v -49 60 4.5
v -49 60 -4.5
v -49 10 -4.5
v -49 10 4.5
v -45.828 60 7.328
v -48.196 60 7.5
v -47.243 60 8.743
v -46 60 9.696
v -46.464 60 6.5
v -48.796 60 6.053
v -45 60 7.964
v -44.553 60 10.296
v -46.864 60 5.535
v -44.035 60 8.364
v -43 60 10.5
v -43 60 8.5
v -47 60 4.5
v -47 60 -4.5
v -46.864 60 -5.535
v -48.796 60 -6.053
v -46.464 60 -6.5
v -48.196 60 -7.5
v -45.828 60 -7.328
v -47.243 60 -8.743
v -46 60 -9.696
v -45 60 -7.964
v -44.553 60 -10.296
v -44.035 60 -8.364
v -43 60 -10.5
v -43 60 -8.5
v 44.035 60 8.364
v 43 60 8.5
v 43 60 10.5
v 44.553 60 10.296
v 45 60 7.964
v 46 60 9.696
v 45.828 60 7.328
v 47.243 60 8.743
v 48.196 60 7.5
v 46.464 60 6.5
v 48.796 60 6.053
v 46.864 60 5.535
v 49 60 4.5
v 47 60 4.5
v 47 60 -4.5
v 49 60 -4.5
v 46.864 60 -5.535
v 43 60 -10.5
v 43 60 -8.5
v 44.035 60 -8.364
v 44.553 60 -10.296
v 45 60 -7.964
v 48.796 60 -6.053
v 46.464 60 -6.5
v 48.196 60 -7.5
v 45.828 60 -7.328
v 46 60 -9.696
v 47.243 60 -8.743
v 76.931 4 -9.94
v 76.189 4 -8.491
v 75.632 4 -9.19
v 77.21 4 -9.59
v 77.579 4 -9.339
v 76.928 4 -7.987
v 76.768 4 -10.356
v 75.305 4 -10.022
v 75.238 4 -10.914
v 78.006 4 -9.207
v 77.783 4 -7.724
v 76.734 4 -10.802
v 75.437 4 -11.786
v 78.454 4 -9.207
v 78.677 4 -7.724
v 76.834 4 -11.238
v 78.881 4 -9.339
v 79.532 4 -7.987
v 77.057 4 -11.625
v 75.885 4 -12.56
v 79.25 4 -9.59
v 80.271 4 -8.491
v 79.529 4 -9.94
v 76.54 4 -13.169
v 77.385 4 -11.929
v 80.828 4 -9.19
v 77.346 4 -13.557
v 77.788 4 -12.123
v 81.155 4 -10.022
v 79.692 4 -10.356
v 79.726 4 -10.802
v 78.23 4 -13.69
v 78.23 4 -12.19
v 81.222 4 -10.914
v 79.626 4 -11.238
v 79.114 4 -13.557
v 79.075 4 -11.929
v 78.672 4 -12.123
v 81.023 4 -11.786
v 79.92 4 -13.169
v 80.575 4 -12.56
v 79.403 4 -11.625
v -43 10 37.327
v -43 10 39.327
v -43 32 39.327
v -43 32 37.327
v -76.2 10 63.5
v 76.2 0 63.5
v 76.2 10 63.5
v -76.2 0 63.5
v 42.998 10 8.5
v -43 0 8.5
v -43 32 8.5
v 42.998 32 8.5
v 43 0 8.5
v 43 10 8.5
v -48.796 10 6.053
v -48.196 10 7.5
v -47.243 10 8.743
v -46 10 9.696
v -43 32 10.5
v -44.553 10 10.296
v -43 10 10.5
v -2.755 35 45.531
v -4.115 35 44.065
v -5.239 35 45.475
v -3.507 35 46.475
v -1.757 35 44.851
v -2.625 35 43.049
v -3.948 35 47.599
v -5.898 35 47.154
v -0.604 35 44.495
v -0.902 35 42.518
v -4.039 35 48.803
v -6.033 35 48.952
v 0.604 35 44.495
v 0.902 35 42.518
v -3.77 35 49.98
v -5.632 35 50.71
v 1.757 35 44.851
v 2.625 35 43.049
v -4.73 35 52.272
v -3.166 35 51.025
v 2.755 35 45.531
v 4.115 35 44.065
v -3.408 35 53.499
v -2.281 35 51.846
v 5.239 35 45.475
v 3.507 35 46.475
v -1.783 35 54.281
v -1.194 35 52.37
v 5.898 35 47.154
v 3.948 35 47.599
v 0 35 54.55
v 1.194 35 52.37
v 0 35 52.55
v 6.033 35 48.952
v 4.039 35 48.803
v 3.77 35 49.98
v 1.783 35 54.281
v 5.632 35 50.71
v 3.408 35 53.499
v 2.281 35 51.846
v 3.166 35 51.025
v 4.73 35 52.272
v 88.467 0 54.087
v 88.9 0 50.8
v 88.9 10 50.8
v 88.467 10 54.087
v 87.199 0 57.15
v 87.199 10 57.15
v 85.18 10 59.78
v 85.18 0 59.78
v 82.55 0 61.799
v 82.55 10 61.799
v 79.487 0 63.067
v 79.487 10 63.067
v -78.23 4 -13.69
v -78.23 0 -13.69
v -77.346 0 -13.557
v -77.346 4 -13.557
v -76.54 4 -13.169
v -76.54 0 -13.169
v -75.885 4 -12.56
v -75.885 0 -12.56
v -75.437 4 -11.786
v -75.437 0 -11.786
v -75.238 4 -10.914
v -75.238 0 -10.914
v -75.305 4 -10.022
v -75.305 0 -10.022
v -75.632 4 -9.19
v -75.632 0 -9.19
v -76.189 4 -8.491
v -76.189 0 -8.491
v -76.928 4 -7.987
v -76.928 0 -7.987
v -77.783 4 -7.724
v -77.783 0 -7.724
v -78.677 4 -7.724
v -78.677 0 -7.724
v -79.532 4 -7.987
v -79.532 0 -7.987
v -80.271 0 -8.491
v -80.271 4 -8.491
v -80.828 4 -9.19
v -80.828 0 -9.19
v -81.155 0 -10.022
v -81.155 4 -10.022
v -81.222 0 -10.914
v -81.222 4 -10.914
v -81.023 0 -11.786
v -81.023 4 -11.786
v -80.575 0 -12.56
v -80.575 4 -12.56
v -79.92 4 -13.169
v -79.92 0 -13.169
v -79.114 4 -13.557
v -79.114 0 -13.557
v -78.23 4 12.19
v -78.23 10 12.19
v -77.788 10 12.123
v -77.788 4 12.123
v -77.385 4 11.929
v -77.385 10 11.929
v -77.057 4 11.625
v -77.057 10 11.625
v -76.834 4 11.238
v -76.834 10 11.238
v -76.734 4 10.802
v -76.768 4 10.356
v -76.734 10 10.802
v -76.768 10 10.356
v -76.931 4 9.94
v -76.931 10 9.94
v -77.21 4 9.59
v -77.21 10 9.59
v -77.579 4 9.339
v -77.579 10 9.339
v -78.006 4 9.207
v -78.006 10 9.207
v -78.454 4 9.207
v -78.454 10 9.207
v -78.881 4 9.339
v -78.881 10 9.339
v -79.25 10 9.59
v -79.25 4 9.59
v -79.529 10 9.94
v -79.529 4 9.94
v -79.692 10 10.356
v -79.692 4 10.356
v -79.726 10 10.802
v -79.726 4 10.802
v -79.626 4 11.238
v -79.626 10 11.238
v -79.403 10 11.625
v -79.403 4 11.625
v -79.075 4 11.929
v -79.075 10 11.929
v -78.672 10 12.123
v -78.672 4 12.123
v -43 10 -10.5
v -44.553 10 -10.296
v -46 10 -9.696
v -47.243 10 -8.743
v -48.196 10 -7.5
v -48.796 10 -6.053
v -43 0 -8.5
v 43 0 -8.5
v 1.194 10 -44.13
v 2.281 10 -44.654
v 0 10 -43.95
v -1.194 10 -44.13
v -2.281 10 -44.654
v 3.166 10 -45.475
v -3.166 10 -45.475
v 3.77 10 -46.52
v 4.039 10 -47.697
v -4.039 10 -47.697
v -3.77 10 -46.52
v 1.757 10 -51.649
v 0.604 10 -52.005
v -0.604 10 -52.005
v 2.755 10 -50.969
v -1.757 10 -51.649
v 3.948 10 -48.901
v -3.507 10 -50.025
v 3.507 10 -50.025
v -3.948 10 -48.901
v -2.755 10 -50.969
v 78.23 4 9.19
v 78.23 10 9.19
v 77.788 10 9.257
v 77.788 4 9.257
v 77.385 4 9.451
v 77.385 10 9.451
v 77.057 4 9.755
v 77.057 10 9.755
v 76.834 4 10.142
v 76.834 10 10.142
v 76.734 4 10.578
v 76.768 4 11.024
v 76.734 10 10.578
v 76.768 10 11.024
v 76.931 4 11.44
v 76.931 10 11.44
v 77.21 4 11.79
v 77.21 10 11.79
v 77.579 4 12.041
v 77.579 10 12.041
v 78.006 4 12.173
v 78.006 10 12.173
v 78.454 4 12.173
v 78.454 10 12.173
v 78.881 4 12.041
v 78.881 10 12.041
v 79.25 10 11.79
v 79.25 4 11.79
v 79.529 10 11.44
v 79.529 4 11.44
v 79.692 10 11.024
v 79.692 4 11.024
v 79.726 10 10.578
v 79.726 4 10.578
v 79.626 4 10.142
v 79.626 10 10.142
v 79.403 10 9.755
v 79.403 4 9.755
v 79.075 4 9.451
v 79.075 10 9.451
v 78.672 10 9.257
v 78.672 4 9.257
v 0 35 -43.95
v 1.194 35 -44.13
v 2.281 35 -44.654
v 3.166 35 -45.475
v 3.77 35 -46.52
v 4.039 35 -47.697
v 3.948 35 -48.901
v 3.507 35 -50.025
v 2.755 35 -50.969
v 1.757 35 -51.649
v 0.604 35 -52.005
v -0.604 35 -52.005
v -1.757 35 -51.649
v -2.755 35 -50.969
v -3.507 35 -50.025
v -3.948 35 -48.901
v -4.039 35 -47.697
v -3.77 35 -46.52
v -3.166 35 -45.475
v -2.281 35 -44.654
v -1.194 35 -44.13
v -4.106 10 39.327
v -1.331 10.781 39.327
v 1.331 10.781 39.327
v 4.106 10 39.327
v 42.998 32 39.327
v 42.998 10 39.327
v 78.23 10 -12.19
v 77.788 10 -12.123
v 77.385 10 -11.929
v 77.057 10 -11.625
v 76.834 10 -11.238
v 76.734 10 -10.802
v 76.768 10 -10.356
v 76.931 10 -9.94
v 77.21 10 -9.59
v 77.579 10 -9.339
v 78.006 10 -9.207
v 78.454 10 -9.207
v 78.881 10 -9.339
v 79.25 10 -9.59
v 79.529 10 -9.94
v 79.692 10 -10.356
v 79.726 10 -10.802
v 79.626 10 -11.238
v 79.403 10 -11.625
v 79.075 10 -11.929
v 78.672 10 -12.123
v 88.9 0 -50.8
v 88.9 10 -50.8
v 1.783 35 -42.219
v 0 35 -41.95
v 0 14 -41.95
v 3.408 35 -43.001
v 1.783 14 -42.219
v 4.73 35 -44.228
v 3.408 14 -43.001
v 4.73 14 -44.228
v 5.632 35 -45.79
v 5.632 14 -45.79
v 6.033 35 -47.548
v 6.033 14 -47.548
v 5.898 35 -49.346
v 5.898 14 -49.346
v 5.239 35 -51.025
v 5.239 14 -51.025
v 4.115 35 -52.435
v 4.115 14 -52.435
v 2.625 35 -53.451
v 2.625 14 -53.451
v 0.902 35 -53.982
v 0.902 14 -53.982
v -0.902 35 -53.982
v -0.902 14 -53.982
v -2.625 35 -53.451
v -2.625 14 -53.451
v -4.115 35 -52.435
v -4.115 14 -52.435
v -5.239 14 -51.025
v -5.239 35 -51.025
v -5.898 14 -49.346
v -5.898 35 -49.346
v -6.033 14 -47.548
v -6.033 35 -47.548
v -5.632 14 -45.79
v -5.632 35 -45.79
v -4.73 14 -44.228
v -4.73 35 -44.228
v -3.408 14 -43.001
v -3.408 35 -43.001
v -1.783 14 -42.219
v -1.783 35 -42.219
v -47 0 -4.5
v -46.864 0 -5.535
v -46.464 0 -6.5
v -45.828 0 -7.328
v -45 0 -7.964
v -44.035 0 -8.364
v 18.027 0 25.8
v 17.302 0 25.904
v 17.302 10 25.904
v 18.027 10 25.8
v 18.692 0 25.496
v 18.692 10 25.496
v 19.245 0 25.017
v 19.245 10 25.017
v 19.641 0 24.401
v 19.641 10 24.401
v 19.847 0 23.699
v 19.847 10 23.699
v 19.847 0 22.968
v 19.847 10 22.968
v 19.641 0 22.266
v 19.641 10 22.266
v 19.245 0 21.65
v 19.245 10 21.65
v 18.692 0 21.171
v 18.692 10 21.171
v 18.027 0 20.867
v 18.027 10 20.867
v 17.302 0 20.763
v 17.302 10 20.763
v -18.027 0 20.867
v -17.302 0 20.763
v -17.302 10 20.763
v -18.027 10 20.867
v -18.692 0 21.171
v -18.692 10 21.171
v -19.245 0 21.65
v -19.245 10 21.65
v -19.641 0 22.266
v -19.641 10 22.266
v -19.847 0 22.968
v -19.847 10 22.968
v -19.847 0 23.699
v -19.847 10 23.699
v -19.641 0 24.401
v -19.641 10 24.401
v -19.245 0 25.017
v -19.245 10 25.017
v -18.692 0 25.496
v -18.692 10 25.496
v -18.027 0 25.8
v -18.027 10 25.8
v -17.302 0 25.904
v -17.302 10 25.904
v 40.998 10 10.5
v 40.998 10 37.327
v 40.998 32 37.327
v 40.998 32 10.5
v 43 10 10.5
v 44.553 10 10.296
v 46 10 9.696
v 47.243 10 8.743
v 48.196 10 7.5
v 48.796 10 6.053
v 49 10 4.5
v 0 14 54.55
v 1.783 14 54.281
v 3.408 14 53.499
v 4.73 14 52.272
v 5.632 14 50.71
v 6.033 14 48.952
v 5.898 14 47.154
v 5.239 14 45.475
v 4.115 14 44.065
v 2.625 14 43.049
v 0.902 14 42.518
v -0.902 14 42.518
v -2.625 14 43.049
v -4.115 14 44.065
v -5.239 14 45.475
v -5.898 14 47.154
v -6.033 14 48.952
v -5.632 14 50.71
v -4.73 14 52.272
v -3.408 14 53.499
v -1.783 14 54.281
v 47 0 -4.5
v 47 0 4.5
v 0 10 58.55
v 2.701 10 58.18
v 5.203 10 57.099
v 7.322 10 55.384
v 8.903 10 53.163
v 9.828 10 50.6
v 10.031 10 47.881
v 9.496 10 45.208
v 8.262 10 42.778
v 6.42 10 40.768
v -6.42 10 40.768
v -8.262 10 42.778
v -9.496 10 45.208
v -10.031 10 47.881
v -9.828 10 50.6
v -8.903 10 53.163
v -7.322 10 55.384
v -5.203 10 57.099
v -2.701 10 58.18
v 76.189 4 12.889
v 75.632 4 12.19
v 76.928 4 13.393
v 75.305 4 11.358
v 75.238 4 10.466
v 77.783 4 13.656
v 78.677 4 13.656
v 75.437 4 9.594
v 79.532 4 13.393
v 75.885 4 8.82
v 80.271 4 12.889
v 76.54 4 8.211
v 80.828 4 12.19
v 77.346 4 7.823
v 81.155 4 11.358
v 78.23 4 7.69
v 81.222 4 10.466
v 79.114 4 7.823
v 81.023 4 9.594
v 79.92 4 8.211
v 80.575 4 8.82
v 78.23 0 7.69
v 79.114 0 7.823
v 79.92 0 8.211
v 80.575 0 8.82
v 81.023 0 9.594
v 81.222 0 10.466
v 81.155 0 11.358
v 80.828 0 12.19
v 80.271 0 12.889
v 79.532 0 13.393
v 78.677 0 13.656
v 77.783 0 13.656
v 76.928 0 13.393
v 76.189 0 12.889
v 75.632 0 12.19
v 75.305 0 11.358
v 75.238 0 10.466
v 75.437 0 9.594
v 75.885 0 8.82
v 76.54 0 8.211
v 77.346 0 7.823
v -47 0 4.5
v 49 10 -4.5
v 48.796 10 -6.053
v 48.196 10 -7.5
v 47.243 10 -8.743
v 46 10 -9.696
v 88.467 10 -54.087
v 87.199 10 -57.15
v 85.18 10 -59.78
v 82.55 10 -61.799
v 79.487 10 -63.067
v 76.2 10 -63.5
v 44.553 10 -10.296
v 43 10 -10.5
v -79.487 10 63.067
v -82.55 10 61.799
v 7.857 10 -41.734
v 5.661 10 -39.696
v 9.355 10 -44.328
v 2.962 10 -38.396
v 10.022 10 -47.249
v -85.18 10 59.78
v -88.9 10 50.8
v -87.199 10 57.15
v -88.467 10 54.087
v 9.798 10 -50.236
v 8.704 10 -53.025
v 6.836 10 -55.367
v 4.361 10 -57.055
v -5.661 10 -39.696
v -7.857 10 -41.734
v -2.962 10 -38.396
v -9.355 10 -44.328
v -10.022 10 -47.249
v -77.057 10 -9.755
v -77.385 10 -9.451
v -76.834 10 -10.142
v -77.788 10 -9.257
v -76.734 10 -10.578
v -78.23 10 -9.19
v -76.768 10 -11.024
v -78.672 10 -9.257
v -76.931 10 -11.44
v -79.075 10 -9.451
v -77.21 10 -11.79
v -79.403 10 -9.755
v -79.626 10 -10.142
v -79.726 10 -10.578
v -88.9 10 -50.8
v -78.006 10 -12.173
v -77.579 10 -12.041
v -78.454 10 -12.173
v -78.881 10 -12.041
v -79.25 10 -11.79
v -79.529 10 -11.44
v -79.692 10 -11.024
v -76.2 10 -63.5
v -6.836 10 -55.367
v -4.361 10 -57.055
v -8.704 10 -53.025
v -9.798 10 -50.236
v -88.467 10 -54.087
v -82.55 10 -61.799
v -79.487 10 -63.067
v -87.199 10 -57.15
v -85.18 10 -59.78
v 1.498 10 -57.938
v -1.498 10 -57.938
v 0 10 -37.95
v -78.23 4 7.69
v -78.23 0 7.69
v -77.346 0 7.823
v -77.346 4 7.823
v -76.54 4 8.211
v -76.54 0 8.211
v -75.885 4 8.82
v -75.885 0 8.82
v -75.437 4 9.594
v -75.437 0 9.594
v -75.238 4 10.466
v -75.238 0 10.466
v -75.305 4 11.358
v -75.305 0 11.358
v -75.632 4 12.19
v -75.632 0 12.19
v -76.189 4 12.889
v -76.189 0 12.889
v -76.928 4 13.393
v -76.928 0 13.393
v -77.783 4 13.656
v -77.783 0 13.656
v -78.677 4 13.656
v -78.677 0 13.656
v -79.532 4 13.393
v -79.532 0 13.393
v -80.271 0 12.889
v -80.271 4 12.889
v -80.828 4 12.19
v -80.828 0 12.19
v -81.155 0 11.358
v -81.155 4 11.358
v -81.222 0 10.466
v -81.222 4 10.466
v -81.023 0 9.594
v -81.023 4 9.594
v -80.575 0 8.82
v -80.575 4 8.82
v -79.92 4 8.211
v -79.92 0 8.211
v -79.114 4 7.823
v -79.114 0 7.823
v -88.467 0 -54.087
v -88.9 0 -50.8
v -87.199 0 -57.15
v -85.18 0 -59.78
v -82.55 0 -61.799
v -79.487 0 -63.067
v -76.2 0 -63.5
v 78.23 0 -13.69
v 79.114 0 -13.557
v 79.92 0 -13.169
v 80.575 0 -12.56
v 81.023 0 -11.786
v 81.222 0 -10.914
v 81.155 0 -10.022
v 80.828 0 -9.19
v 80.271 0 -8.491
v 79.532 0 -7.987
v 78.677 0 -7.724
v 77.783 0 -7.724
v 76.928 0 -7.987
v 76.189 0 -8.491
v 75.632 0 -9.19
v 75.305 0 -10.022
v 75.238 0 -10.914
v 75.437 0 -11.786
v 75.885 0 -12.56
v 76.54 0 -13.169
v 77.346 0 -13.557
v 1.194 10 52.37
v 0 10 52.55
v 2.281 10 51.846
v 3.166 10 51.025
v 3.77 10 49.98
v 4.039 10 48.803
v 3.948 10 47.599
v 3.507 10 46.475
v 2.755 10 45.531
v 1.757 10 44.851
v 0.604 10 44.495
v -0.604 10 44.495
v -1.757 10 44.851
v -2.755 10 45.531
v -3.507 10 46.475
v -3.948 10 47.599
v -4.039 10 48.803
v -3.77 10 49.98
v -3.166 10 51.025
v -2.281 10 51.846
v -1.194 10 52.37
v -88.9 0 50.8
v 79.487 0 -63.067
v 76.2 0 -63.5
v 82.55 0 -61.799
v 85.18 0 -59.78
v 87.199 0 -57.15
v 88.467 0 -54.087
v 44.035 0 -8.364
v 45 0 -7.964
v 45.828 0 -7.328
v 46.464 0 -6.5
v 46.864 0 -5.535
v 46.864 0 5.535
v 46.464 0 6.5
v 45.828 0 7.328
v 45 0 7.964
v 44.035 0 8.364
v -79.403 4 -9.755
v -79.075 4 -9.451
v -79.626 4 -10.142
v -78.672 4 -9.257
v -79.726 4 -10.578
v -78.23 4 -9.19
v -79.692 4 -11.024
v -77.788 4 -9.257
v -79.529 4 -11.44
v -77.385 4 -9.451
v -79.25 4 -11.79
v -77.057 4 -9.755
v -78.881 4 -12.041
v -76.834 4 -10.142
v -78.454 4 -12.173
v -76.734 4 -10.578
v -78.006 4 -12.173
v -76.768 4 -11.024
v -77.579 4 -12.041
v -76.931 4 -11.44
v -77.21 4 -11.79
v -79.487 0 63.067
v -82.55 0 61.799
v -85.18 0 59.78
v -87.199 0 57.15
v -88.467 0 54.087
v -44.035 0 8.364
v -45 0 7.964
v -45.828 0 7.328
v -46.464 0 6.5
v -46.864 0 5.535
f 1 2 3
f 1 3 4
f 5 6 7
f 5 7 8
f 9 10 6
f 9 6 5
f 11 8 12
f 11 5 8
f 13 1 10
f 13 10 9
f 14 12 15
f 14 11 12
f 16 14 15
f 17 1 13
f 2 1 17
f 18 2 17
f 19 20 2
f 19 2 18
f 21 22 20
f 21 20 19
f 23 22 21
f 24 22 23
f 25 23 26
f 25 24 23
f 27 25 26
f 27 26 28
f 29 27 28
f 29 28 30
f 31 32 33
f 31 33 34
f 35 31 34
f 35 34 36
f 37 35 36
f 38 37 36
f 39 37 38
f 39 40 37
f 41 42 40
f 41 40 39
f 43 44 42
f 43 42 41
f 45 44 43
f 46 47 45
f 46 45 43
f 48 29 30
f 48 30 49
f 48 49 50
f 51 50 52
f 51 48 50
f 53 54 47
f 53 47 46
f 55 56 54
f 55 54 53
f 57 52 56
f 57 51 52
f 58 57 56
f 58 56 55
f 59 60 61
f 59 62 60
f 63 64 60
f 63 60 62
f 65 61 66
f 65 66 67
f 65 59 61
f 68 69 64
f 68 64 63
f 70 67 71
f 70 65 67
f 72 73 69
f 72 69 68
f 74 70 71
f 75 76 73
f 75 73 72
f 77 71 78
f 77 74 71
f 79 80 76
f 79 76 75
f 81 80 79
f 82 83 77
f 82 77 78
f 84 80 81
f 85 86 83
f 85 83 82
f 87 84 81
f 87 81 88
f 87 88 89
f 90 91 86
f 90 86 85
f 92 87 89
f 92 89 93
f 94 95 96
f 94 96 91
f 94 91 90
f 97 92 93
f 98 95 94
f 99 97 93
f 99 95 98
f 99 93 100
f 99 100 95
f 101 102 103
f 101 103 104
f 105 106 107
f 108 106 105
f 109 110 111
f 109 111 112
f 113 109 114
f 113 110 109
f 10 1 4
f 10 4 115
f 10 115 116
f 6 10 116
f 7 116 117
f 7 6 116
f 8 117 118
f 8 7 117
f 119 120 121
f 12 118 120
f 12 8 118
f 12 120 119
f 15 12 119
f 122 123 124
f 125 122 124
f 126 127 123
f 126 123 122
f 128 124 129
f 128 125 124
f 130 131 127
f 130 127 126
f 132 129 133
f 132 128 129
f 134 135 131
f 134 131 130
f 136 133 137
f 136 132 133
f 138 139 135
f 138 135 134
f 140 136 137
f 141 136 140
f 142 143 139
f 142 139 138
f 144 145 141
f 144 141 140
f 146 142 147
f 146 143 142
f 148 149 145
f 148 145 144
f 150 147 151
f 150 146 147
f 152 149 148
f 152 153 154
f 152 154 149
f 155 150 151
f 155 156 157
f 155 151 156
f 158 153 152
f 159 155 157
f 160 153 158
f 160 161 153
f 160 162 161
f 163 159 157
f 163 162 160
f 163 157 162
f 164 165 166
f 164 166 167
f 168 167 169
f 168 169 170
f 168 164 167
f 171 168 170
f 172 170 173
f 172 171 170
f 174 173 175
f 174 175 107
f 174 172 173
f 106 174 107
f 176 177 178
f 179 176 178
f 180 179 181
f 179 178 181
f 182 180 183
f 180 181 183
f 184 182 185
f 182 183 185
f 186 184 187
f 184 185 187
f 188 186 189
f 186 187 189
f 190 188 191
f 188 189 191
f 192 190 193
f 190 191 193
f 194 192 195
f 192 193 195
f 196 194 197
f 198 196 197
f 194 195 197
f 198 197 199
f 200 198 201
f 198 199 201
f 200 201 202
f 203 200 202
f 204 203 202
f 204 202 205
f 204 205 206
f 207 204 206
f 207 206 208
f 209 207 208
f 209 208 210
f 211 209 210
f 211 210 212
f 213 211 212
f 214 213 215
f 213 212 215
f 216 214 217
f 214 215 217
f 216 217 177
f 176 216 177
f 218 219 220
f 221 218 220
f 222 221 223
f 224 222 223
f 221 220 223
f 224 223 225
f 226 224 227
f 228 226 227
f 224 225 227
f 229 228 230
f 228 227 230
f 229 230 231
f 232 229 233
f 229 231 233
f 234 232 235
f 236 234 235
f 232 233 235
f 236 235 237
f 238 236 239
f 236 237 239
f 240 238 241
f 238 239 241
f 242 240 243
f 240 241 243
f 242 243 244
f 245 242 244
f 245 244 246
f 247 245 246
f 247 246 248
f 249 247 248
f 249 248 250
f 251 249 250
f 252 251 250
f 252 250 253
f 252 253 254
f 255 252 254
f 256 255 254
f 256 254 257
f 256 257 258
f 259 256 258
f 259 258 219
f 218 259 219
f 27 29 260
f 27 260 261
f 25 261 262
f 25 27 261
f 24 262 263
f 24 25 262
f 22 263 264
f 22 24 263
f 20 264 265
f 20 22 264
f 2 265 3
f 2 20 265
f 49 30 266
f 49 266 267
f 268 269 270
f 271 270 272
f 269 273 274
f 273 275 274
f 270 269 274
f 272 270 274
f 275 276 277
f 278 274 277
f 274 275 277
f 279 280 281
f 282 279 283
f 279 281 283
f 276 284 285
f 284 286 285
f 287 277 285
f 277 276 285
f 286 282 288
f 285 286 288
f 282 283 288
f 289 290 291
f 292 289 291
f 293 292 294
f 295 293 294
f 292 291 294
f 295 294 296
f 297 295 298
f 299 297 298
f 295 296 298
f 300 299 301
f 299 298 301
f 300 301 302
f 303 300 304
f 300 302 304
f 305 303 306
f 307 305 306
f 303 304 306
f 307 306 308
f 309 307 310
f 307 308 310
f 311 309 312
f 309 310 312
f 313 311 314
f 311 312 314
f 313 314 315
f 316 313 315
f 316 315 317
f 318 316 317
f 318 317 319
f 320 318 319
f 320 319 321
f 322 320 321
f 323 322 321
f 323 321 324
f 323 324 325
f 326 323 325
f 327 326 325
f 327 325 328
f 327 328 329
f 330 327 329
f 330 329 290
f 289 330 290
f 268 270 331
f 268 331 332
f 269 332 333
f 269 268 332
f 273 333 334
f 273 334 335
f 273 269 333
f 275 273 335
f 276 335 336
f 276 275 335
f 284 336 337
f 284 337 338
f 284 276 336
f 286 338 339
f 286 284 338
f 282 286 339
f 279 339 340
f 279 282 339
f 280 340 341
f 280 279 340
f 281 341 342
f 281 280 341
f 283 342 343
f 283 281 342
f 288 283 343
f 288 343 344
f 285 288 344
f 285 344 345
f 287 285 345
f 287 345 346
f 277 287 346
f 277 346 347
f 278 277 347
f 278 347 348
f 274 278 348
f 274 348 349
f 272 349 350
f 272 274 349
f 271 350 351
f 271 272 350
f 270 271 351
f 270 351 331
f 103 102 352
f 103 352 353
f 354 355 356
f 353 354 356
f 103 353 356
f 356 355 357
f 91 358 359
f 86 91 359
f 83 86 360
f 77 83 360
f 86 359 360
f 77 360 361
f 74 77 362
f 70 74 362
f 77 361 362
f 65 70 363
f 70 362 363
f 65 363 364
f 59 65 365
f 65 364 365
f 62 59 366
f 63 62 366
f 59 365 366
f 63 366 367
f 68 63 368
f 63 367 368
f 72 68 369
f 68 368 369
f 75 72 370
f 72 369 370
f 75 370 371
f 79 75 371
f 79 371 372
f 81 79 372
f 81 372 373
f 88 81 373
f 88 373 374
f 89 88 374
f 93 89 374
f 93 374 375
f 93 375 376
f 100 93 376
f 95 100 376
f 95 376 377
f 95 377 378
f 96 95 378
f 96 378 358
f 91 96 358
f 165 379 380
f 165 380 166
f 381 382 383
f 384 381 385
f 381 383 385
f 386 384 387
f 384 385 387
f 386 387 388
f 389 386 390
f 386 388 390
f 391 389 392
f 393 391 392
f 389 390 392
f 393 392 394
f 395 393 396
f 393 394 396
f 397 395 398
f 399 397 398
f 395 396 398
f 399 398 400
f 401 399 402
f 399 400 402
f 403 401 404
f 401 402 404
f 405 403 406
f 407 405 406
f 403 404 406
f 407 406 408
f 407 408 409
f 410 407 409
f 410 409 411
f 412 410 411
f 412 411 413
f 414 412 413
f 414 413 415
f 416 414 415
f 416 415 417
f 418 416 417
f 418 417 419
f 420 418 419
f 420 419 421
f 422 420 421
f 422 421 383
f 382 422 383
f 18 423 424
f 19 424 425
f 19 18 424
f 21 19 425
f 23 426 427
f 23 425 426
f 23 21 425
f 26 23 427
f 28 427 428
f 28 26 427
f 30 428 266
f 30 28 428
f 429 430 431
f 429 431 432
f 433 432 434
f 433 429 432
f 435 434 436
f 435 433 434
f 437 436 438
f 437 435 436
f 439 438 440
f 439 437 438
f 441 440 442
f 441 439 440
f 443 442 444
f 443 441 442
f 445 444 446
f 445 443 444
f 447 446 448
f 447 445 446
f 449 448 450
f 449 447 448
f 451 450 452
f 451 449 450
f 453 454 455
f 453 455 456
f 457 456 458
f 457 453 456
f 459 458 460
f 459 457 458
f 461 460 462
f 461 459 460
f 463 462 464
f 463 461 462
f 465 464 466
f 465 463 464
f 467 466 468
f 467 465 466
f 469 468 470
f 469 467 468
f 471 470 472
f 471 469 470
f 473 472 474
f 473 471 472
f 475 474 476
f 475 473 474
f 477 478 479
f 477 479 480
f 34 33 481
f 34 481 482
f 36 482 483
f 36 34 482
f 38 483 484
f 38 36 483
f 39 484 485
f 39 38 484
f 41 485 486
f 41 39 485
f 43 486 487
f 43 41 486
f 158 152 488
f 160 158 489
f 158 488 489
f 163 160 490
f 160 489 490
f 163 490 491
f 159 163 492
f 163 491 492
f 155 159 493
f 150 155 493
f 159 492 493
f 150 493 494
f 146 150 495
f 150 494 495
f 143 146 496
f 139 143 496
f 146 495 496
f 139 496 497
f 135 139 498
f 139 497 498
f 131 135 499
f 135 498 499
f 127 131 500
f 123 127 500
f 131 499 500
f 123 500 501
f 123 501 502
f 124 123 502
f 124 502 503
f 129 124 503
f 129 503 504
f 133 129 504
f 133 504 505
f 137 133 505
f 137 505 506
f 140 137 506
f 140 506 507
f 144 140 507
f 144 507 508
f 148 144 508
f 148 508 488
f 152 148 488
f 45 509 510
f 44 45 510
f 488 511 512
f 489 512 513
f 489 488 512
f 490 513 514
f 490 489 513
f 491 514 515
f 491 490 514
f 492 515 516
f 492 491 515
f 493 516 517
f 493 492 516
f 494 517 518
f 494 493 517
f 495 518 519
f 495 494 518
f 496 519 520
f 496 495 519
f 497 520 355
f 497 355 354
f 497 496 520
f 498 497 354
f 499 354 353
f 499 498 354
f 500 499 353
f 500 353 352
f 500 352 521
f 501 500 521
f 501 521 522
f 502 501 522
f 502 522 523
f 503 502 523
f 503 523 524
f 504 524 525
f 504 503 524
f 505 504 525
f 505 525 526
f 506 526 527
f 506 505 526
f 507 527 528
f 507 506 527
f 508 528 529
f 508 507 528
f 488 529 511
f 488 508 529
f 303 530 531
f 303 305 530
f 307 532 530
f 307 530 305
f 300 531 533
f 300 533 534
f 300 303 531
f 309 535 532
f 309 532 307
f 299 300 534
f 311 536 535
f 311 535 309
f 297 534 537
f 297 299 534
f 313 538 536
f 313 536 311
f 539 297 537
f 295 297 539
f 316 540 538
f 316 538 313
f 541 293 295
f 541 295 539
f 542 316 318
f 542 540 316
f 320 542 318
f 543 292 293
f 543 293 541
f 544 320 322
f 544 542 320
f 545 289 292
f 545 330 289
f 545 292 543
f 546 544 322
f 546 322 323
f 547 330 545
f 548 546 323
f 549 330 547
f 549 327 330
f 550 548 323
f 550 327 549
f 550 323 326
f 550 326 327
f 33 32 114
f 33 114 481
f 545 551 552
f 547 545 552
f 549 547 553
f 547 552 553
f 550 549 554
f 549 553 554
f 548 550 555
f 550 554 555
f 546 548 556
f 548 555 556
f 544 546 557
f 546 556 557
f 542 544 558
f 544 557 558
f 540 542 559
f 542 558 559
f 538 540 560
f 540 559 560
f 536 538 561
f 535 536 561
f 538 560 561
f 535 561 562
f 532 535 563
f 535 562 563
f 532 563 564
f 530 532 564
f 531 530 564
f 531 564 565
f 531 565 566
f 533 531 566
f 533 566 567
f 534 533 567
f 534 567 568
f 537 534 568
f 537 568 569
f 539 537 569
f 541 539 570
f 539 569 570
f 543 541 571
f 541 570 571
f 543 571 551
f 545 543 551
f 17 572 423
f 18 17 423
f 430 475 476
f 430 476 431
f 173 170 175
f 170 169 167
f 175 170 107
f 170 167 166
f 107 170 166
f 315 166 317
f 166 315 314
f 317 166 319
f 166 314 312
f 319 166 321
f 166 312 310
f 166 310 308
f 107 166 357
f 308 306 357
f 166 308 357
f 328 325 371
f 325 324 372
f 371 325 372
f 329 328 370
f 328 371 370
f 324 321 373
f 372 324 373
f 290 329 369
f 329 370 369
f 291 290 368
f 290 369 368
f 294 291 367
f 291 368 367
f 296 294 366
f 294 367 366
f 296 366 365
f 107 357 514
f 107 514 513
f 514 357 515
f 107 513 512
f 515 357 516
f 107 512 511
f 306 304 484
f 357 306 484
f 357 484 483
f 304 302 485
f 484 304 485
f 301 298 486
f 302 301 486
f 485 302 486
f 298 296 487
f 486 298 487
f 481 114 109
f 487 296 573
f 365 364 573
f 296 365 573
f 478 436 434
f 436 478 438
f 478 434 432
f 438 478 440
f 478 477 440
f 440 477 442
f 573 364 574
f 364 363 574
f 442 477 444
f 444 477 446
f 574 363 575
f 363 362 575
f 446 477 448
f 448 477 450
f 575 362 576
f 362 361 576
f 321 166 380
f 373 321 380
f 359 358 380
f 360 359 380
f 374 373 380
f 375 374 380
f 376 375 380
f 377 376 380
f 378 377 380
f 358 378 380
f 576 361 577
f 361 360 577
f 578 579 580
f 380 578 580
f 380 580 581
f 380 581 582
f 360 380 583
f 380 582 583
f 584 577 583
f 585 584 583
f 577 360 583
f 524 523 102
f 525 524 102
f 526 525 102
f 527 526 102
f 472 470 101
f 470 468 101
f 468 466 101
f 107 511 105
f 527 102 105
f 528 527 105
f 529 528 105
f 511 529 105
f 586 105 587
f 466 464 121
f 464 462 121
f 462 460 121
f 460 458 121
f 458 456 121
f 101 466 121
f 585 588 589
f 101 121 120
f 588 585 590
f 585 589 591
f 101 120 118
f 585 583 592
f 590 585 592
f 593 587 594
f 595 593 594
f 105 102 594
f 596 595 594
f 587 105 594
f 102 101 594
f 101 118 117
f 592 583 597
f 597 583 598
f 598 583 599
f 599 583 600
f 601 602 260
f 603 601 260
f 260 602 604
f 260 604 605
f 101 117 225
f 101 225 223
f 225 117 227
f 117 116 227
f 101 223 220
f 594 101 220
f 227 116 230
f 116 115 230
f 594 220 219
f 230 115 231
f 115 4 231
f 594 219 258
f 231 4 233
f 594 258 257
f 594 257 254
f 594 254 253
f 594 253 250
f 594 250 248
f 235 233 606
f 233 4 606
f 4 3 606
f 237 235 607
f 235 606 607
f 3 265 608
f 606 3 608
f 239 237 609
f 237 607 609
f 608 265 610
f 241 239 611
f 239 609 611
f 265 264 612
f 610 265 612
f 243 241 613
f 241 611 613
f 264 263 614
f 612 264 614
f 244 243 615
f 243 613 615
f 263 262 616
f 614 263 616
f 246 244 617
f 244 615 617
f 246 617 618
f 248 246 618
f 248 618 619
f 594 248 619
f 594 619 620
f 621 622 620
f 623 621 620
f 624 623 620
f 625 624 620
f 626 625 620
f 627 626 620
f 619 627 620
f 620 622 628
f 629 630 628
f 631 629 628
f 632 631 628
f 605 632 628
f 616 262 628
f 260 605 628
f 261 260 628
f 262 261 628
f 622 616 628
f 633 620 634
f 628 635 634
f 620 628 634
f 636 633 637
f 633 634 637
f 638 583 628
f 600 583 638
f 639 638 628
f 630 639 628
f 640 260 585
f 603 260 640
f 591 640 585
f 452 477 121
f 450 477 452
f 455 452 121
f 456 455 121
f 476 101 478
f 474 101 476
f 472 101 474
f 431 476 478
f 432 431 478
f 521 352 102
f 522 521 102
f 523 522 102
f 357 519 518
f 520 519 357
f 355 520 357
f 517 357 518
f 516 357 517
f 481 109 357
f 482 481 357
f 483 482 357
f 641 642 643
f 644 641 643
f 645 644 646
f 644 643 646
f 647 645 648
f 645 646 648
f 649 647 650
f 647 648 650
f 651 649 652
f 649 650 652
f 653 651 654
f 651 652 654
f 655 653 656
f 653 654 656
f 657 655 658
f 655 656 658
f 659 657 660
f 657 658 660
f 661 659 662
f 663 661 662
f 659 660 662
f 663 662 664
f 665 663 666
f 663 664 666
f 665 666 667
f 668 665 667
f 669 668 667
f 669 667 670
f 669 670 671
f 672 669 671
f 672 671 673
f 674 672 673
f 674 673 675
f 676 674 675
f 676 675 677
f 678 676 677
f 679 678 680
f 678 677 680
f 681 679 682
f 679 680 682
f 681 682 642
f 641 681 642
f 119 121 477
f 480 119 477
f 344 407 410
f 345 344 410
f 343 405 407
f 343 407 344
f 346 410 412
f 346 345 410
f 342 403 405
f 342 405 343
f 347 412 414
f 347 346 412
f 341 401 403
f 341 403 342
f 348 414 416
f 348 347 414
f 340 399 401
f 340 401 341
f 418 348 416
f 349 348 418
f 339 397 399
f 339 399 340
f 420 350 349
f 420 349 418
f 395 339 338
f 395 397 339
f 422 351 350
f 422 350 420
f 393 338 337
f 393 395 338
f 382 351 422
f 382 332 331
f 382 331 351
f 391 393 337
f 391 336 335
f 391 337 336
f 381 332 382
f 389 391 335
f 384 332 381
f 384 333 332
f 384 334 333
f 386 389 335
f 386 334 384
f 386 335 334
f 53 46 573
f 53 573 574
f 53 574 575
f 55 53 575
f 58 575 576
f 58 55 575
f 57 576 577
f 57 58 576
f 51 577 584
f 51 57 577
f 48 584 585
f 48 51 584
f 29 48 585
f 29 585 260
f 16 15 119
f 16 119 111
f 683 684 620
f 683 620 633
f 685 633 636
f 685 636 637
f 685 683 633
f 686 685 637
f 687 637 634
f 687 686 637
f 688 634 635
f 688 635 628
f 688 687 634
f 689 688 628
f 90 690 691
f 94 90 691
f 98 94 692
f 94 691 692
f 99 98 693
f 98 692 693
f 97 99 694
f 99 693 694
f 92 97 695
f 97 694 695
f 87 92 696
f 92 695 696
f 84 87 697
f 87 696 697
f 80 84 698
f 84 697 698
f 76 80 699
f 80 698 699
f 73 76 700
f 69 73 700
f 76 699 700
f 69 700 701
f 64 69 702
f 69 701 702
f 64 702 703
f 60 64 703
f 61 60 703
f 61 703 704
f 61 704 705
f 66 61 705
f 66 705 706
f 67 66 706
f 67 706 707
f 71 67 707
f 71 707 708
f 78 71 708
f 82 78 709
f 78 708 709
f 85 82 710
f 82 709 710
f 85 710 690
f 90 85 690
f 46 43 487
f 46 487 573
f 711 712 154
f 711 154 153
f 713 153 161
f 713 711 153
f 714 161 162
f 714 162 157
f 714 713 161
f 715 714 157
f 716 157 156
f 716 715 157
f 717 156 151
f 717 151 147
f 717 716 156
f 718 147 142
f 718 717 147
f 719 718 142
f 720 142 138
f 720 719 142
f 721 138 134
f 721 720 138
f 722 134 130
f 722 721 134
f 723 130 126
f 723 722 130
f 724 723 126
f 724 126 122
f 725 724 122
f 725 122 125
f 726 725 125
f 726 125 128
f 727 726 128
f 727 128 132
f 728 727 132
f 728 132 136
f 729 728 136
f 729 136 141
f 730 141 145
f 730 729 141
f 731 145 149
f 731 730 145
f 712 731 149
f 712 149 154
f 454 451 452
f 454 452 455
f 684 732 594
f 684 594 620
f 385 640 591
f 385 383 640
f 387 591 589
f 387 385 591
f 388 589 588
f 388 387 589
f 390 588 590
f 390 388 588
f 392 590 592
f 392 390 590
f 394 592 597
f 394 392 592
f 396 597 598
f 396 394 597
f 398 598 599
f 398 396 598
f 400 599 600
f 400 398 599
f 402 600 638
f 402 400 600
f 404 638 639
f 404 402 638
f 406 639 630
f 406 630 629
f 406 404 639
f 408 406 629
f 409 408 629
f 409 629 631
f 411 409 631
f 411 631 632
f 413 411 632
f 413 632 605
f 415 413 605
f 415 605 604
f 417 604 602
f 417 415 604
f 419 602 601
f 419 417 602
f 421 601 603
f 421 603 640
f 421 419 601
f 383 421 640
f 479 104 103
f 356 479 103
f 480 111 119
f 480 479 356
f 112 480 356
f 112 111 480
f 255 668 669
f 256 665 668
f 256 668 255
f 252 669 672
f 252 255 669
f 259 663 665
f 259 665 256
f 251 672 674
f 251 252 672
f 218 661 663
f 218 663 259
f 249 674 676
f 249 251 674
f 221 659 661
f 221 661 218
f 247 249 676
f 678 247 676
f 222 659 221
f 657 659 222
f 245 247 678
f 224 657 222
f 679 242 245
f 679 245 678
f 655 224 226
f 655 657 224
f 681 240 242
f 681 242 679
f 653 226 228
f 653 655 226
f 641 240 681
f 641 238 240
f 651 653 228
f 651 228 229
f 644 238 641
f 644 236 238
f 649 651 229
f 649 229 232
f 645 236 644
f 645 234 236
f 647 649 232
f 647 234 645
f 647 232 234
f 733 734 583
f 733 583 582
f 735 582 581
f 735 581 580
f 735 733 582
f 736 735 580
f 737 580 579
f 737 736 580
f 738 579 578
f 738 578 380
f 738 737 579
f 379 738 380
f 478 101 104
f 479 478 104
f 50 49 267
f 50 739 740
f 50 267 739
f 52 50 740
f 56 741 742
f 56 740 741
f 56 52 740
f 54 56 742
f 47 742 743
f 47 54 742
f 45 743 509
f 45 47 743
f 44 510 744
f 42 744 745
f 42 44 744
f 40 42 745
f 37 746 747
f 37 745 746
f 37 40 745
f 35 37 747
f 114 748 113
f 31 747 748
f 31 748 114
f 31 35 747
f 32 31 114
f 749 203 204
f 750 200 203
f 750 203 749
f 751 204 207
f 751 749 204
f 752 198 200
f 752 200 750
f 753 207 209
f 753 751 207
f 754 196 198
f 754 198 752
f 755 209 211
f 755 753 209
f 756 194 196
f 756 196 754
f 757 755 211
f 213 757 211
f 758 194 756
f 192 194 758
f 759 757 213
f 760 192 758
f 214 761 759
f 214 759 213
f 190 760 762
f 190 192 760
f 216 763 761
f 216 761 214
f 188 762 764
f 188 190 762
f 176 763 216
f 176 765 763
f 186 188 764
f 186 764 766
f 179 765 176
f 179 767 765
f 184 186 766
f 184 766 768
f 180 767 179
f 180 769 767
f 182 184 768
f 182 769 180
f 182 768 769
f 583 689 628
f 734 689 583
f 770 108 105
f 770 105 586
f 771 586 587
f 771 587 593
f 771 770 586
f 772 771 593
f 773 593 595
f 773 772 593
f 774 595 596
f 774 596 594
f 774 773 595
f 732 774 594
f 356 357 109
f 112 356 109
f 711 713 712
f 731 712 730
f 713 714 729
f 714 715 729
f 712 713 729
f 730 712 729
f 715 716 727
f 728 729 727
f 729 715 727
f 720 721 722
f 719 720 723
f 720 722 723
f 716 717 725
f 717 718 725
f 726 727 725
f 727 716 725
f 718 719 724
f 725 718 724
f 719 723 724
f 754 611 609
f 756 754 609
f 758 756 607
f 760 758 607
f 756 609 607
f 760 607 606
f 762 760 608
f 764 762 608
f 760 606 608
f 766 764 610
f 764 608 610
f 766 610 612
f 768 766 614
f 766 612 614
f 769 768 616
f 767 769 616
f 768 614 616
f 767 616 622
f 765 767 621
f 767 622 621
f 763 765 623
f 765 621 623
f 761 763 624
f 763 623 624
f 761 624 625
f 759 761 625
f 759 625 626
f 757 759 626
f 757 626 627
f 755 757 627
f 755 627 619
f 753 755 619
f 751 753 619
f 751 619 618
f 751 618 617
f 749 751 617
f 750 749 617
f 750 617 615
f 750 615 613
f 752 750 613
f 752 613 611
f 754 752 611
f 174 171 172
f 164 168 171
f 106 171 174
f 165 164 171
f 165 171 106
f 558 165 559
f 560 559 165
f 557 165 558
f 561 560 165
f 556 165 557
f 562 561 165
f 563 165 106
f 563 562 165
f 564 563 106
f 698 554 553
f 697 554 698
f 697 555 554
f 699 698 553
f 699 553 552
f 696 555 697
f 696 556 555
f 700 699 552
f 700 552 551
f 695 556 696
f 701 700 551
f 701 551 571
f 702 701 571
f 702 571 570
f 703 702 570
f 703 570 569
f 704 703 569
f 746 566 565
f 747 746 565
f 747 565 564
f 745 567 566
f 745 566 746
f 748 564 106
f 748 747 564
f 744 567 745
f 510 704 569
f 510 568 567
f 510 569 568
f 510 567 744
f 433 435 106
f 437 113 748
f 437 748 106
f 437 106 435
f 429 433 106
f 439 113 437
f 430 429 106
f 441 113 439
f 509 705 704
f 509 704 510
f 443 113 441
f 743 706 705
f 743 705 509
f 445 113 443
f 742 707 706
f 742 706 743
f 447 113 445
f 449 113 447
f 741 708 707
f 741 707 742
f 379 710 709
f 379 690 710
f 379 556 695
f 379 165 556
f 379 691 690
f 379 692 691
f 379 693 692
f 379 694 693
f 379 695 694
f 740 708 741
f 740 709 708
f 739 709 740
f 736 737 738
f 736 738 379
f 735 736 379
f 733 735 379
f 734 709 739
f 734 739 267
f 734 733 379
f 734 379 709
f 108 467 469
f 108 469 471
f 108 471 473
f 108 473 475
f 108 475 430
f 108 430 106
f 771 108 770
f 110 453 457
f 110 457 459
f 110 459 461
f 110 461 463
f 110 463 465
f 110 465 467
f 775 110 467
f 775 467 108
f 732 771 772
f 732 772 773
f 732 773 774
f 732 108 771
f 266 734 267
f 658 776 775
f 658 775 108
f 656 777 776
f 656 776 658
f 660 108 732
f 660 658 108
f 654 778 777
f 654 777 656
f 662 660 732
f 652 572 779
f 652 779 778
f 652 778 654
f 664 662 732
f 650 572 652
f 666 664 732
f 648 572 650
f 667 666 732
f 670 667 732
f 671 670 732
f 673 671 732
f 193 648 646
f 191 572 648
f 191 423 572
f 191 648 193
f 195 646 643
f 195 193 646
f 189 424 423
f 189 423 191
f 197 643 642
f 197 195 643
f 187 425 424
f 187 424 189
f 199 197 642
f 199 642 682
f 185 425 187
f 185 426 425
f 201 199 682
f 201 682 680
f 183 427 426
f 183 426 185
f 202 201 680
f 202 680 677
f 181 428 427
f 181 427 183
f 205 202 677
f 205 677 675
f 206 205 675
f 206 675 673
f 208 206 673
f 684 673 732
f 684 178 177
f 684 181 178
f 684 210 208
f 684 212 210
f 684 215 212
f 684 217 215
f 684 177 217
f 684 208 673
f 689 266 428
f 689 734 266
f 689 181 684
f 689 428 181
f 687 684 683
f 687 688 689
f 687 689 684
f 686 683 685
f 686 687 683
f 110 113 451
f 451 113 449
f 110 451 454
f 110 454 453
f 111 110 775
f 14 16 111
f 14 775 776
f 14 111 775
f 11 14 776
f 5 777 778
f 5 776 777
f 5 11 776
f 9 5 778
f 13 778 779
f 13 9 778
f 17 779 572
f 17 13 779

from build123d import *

# Parameters (mm, degrees)
BOSS_EXTRUDE1_DEPTH = 10
SKETCH3_R           = 6.05
SKETCH3_R_2         = 4.05
BOSS_EXTRUDE2_DEPTH = 25
SKETCH4_R           = 1.5
CUT_EXTRUDE1_DEPTH  = 113.073458053
SKETCH5_R           = 3
CUT_EXTRUDE2_DEPTH  = 4
CUT_EXTRUDE3_DEPTH  = 113.073458053
SKETCH7_W           = 85.997746486
SKETCH7_H           = 30.827207152
SKETCH7_W_2         = 81.997746486
SKETCH7_H_2         = 26.827207152
BOSS_EXTRUDE3_DEPTH = 22
SKETCH9_W           = 26.827207152
SKETCH9_H           = 22
CUT_EXTRUDE7_DEPTH  = 22
BOSS_EXTRUDE4_START = 50
BOSS_EXTRUDE4_DEPTH = 50
CUT_EXTRUDE8_DEPTH  = 22
CHAMFER2_SIZE       = 4


with BuildPart() as part:
    # Sketch2 → Boss-Extrude1 (new body)
    with BuildSketch(Plane(origin=(0, 0, 0), x_dir=(1, 0, 0), z_dir=(0, 1, 0))):
        with BuildLine():
            Line((-76.2, 63.5), (76.2, 63.5))
            ThreePointArc((76.2, 63.5), (85.180256121, 59.780256121), (88.9, 50.8))
            Line((88.9, 50.8), (88.9, -50.8))
            ThreePointArc((88.9, -50.8), (85.180256121, -59.780256121), (76.2, -63.5))
            Line((76.2, -63.5), (-76.2, -63.5))
            ThreePointArc((-76.2, -63.5), (-85.180256121, -59.780256121), (-88.9, -50.8))
            Line((-88.9, -50.8), (-88.9, 50.8))
            ThreePointArc((-88.9, 50.8), (-85.180256121, 59.780256121), (-76.2, 63.5))
        make_face()
    extrude(amount=BOSS_EXTRUDE1_DEPTH)

    # Sketch3 → Boss-Extrude2 (add)
    # profile 1 of 2: a face of its own
    with BuildSketch(Plane(origin=(0, 10, 0), x_dir=(1, 0, 0), z_dir=(0, 1, 0))):
        with Locations(Location((0, 48, 0), (0, 0, 270))):
            Circle(SKETCH3_R)
        with Locations(Location((0, 48, 0), (0, 0, 270))):
            Circle(SKETCH3_R_2, mode=Mode.SUBTRACT)
    # profile 2 of 2: a face of its own
    with BuildSketch(Plane(origin=(0, 10, 0), x_dir=(1, 0, 0), z_dir=(0, 1, 0))):
        with Locations(Location((0, -48.5, 0), (0, 0, 270))):
            Circle(SKETCH3_R)
        with Locations(Location((0, -48.5, 0), (0, 0, 270))):
            Circle(SKETCH3_R_2, mode=Mode.SUBTRACT)
    extrude(amount=BOSS_EXTRUDE2_DEPTH)

    # Sketch4 → Cut-Extrude1 (cut, through all)
    with BuildSketch(Plane(origin=(0, 10, 0), x_dir=(1, 0, 0), z_dir=(0, 1, 0))):
        with Locations(Location((-78.23, 10.69, 0), (0, 0, 270))):
            Circle(SKETCH4_R)
        with Locations(Location((-78.23, -10.69, 0), (0, 0, 270))):
            Circle(SKETCH4_R)
        with Locations(Location((78.23, -10.69, 0), (0, 0, 90))):
            Circle(SKETCH4_R)
        with Locations(Location((78.23, 10.69, 0), (0, 0, 90))):
            Circle(SKETCH4_R)
    extrude(amount=-CUT_EXTRUDE1_DEPTH, mode=Mode.SUBTRACT)

    # Sketch5 → Cut-Extrude2 (cut)
    with BuildSketch(Plane.XZ):
        with Locations(Location((-78.23, 10.69, 0), (0, 0, 270))):
            Circle(SKETCH5_R)
        with Locations(Location((-78.23, -10.69, 0), (0, 0, 270))):
            Circle(SKETCH5_R)
        with Locations(Location((78.23, 10.69, 0), (0, 0, 270))):
            Circle(SKETCH5_R)
        with Locations(Location((78.23, -10.69, 0), (0, 0, 270))):
            Circle(SKETCH5_R)
    extrude(amount=-CUT_EXTRUDE2_DEPTH, mode=Mode.SUBTRACT)

    # Sketch6 → Cut-Extrude3 (cut, through all)
    with BuildSketch(Plane(origin=(0, 10, 0), x_dir=(1, 0, 0), z_dir=(0, 1, 0))):
        with BuildLine():
            Line((-43, 8.5), (43, 8.5))
            ThreePointArc((43, 8.5), (45.828427125, 7.328427125), (47, 4.5))
            Line((47, 4.5), (47, -4.5))
            ThreePointArc((47, -4.5), (45.828427125, -7.328427125), (43, -8.5))
            Line((43, -8.5), (-43, -8.5))
            ThreePointArc((-43, -8.5), (-45.828427125, -7.328427125), (-47, -4.5))
            Line((-47, -4.5), (-47, 4.5))
            ThreePointArc((-47, 4.5), (-45.828427125, 7.328427125), (-43, 8.5))
        make_face()
    extrude(amount=-CUT_EXTRUDE3_DEPTH, mode=Mode.SUBTRACT)

    # Sketch7 → Boss-Extrude3 (add)
    with BuildSketch(Plane(origin=(0, 10, 0), x_dir=(1, 0, 0), z_dir=(0, 1, 0))):
        with Locations((-0.001126757, -23.913603576)):
            Rectangle(SKETCH7_W, SKETCH7_H)
        with Locations((-0.001126757, -23.913603576)):
            Rectangle(SKETCH7_W_2, SKETCH7_H_2, mode=Mode.SUBTRACT)
    extrude(amount=BOSS_EXTRUDE3_DEPTH)

    # Sketch9 → Cut-Extrude7 (cut)
    with BuildSketch(Plane.ZY.offset(43)):
        with Locations((23.913603576, 21)):
            Rectangle(SKETCH9_W, SKETCH9_H)
    extrude(amount=-CUT_EXTRUDE7_DEPTH, mode=Mode.SUBTRACT)

    # Sketch10 → Boss-Extrude4 (add)
    with BuildSketch(Plane(origin=(0, 10, 0), x_dir=(1, 0, 0), z_dir=(0, 1, 0)).offset(BOSS_EXTRUDE4_START)):
        with BuildLine():
            Line((-49, 4.5), (-49, -4.5))
            ThreePointArc((-49, -4.5), (-47.242640687, -8.742640687), (-43, -10.5))
            Line((-43, -10.5), (-43, -8.5))
            ThreePointArc((-43, -8.5), (-45.828427125, -7.328427125), (-47, -4.5))
            Line((-47, -4.5), (-47, 4.5))
            ThreePointArc((-47, 4.5), (-45.828427125, 7.328427125), (-43, 8.5))
            Line((-43, 8.5), (43, 8.5))
            ThreePointArc((43, 8.5), (45.828427125, 7.328427125), (47, 4.5))
            Line((47, 4.5), (47, -4.5))
            ThreePointArc((47, -4.5), (45.828427125, -7.328427125), (43, -8.5))
            Line((43, -8.5), (43, -10.5))
            ThreePointArc((43, -10.5), (47.242640687, -8.742640687), (49, -4.5))
            Line((49, -4.5), (49, 4.5))
            ThreePointArc((49, 4.5), (47.242640687, 8.742640687), (43, 10.5))
            Line((43, 10.5), (-43, 10.5))
            ThreePointArc((-43, 10.5), (-47.242640687, 8.742640687), (-49, 4.5))
        make_face()
    extrude(amount=-BOSS_EXTRUDE4_DEPTH)

    # Sketch11 → Cut-Extrude8 (cut)
    with BuildSketch(Plane.XZ):
        with BuildLine():
            Line((-17.302391978, 25.904152562), (17.302391978, 25.904152562))
            ThreePointArc((17.302391978, 25.904152562), (19.873033072, 23.333511468), (17.302391978, 20.762870374))
            Line((17.302391978, 20.762870374), (-17.302391978, 20.762870374))
            ThreePointArc((-17.302391978, 20.762870374), (-19.873033072, 23.333511468), (-17.302391978, 25.904152562))
        make_face()
    extrude(amount=-CUT_EXTRUDE8_DEPTH, mode=Mode.SUBTRACT)

    # Chamfer2
    # the kernel refuses this chamfer: 4 mm, written as the material it adds along each edge
    with BuildSketch(Plane(origin=(0, 10, -48), x_dir=(0, 0, 1), z_dir=(-1, 0, 0))) as chamfer2_piece_1:
        Polygon((6.05 + CHAMFER2_SIZE, 0), (6.05, CHAMFER2_SIZE), (6.05, 0), align=None)
    revolve(axis=Axis((0, 10, -48), (0, 1, 0)))
    with BuildSketch(Plane(origin=(0, 10, 48.5), x_dir=(0, 0, 1), z_dir=(-1, 0, 0))) as chamfer2_piece_2:
        Polygon((6.05 + CHAMFER2_SIZE, 0), (6.05, CHAMFER2_SIZE), (6.05, 0), align=None)
    revolve(axis=Axis((0, 10, 48.5), (0, 1, 0)))


solid = part.part
